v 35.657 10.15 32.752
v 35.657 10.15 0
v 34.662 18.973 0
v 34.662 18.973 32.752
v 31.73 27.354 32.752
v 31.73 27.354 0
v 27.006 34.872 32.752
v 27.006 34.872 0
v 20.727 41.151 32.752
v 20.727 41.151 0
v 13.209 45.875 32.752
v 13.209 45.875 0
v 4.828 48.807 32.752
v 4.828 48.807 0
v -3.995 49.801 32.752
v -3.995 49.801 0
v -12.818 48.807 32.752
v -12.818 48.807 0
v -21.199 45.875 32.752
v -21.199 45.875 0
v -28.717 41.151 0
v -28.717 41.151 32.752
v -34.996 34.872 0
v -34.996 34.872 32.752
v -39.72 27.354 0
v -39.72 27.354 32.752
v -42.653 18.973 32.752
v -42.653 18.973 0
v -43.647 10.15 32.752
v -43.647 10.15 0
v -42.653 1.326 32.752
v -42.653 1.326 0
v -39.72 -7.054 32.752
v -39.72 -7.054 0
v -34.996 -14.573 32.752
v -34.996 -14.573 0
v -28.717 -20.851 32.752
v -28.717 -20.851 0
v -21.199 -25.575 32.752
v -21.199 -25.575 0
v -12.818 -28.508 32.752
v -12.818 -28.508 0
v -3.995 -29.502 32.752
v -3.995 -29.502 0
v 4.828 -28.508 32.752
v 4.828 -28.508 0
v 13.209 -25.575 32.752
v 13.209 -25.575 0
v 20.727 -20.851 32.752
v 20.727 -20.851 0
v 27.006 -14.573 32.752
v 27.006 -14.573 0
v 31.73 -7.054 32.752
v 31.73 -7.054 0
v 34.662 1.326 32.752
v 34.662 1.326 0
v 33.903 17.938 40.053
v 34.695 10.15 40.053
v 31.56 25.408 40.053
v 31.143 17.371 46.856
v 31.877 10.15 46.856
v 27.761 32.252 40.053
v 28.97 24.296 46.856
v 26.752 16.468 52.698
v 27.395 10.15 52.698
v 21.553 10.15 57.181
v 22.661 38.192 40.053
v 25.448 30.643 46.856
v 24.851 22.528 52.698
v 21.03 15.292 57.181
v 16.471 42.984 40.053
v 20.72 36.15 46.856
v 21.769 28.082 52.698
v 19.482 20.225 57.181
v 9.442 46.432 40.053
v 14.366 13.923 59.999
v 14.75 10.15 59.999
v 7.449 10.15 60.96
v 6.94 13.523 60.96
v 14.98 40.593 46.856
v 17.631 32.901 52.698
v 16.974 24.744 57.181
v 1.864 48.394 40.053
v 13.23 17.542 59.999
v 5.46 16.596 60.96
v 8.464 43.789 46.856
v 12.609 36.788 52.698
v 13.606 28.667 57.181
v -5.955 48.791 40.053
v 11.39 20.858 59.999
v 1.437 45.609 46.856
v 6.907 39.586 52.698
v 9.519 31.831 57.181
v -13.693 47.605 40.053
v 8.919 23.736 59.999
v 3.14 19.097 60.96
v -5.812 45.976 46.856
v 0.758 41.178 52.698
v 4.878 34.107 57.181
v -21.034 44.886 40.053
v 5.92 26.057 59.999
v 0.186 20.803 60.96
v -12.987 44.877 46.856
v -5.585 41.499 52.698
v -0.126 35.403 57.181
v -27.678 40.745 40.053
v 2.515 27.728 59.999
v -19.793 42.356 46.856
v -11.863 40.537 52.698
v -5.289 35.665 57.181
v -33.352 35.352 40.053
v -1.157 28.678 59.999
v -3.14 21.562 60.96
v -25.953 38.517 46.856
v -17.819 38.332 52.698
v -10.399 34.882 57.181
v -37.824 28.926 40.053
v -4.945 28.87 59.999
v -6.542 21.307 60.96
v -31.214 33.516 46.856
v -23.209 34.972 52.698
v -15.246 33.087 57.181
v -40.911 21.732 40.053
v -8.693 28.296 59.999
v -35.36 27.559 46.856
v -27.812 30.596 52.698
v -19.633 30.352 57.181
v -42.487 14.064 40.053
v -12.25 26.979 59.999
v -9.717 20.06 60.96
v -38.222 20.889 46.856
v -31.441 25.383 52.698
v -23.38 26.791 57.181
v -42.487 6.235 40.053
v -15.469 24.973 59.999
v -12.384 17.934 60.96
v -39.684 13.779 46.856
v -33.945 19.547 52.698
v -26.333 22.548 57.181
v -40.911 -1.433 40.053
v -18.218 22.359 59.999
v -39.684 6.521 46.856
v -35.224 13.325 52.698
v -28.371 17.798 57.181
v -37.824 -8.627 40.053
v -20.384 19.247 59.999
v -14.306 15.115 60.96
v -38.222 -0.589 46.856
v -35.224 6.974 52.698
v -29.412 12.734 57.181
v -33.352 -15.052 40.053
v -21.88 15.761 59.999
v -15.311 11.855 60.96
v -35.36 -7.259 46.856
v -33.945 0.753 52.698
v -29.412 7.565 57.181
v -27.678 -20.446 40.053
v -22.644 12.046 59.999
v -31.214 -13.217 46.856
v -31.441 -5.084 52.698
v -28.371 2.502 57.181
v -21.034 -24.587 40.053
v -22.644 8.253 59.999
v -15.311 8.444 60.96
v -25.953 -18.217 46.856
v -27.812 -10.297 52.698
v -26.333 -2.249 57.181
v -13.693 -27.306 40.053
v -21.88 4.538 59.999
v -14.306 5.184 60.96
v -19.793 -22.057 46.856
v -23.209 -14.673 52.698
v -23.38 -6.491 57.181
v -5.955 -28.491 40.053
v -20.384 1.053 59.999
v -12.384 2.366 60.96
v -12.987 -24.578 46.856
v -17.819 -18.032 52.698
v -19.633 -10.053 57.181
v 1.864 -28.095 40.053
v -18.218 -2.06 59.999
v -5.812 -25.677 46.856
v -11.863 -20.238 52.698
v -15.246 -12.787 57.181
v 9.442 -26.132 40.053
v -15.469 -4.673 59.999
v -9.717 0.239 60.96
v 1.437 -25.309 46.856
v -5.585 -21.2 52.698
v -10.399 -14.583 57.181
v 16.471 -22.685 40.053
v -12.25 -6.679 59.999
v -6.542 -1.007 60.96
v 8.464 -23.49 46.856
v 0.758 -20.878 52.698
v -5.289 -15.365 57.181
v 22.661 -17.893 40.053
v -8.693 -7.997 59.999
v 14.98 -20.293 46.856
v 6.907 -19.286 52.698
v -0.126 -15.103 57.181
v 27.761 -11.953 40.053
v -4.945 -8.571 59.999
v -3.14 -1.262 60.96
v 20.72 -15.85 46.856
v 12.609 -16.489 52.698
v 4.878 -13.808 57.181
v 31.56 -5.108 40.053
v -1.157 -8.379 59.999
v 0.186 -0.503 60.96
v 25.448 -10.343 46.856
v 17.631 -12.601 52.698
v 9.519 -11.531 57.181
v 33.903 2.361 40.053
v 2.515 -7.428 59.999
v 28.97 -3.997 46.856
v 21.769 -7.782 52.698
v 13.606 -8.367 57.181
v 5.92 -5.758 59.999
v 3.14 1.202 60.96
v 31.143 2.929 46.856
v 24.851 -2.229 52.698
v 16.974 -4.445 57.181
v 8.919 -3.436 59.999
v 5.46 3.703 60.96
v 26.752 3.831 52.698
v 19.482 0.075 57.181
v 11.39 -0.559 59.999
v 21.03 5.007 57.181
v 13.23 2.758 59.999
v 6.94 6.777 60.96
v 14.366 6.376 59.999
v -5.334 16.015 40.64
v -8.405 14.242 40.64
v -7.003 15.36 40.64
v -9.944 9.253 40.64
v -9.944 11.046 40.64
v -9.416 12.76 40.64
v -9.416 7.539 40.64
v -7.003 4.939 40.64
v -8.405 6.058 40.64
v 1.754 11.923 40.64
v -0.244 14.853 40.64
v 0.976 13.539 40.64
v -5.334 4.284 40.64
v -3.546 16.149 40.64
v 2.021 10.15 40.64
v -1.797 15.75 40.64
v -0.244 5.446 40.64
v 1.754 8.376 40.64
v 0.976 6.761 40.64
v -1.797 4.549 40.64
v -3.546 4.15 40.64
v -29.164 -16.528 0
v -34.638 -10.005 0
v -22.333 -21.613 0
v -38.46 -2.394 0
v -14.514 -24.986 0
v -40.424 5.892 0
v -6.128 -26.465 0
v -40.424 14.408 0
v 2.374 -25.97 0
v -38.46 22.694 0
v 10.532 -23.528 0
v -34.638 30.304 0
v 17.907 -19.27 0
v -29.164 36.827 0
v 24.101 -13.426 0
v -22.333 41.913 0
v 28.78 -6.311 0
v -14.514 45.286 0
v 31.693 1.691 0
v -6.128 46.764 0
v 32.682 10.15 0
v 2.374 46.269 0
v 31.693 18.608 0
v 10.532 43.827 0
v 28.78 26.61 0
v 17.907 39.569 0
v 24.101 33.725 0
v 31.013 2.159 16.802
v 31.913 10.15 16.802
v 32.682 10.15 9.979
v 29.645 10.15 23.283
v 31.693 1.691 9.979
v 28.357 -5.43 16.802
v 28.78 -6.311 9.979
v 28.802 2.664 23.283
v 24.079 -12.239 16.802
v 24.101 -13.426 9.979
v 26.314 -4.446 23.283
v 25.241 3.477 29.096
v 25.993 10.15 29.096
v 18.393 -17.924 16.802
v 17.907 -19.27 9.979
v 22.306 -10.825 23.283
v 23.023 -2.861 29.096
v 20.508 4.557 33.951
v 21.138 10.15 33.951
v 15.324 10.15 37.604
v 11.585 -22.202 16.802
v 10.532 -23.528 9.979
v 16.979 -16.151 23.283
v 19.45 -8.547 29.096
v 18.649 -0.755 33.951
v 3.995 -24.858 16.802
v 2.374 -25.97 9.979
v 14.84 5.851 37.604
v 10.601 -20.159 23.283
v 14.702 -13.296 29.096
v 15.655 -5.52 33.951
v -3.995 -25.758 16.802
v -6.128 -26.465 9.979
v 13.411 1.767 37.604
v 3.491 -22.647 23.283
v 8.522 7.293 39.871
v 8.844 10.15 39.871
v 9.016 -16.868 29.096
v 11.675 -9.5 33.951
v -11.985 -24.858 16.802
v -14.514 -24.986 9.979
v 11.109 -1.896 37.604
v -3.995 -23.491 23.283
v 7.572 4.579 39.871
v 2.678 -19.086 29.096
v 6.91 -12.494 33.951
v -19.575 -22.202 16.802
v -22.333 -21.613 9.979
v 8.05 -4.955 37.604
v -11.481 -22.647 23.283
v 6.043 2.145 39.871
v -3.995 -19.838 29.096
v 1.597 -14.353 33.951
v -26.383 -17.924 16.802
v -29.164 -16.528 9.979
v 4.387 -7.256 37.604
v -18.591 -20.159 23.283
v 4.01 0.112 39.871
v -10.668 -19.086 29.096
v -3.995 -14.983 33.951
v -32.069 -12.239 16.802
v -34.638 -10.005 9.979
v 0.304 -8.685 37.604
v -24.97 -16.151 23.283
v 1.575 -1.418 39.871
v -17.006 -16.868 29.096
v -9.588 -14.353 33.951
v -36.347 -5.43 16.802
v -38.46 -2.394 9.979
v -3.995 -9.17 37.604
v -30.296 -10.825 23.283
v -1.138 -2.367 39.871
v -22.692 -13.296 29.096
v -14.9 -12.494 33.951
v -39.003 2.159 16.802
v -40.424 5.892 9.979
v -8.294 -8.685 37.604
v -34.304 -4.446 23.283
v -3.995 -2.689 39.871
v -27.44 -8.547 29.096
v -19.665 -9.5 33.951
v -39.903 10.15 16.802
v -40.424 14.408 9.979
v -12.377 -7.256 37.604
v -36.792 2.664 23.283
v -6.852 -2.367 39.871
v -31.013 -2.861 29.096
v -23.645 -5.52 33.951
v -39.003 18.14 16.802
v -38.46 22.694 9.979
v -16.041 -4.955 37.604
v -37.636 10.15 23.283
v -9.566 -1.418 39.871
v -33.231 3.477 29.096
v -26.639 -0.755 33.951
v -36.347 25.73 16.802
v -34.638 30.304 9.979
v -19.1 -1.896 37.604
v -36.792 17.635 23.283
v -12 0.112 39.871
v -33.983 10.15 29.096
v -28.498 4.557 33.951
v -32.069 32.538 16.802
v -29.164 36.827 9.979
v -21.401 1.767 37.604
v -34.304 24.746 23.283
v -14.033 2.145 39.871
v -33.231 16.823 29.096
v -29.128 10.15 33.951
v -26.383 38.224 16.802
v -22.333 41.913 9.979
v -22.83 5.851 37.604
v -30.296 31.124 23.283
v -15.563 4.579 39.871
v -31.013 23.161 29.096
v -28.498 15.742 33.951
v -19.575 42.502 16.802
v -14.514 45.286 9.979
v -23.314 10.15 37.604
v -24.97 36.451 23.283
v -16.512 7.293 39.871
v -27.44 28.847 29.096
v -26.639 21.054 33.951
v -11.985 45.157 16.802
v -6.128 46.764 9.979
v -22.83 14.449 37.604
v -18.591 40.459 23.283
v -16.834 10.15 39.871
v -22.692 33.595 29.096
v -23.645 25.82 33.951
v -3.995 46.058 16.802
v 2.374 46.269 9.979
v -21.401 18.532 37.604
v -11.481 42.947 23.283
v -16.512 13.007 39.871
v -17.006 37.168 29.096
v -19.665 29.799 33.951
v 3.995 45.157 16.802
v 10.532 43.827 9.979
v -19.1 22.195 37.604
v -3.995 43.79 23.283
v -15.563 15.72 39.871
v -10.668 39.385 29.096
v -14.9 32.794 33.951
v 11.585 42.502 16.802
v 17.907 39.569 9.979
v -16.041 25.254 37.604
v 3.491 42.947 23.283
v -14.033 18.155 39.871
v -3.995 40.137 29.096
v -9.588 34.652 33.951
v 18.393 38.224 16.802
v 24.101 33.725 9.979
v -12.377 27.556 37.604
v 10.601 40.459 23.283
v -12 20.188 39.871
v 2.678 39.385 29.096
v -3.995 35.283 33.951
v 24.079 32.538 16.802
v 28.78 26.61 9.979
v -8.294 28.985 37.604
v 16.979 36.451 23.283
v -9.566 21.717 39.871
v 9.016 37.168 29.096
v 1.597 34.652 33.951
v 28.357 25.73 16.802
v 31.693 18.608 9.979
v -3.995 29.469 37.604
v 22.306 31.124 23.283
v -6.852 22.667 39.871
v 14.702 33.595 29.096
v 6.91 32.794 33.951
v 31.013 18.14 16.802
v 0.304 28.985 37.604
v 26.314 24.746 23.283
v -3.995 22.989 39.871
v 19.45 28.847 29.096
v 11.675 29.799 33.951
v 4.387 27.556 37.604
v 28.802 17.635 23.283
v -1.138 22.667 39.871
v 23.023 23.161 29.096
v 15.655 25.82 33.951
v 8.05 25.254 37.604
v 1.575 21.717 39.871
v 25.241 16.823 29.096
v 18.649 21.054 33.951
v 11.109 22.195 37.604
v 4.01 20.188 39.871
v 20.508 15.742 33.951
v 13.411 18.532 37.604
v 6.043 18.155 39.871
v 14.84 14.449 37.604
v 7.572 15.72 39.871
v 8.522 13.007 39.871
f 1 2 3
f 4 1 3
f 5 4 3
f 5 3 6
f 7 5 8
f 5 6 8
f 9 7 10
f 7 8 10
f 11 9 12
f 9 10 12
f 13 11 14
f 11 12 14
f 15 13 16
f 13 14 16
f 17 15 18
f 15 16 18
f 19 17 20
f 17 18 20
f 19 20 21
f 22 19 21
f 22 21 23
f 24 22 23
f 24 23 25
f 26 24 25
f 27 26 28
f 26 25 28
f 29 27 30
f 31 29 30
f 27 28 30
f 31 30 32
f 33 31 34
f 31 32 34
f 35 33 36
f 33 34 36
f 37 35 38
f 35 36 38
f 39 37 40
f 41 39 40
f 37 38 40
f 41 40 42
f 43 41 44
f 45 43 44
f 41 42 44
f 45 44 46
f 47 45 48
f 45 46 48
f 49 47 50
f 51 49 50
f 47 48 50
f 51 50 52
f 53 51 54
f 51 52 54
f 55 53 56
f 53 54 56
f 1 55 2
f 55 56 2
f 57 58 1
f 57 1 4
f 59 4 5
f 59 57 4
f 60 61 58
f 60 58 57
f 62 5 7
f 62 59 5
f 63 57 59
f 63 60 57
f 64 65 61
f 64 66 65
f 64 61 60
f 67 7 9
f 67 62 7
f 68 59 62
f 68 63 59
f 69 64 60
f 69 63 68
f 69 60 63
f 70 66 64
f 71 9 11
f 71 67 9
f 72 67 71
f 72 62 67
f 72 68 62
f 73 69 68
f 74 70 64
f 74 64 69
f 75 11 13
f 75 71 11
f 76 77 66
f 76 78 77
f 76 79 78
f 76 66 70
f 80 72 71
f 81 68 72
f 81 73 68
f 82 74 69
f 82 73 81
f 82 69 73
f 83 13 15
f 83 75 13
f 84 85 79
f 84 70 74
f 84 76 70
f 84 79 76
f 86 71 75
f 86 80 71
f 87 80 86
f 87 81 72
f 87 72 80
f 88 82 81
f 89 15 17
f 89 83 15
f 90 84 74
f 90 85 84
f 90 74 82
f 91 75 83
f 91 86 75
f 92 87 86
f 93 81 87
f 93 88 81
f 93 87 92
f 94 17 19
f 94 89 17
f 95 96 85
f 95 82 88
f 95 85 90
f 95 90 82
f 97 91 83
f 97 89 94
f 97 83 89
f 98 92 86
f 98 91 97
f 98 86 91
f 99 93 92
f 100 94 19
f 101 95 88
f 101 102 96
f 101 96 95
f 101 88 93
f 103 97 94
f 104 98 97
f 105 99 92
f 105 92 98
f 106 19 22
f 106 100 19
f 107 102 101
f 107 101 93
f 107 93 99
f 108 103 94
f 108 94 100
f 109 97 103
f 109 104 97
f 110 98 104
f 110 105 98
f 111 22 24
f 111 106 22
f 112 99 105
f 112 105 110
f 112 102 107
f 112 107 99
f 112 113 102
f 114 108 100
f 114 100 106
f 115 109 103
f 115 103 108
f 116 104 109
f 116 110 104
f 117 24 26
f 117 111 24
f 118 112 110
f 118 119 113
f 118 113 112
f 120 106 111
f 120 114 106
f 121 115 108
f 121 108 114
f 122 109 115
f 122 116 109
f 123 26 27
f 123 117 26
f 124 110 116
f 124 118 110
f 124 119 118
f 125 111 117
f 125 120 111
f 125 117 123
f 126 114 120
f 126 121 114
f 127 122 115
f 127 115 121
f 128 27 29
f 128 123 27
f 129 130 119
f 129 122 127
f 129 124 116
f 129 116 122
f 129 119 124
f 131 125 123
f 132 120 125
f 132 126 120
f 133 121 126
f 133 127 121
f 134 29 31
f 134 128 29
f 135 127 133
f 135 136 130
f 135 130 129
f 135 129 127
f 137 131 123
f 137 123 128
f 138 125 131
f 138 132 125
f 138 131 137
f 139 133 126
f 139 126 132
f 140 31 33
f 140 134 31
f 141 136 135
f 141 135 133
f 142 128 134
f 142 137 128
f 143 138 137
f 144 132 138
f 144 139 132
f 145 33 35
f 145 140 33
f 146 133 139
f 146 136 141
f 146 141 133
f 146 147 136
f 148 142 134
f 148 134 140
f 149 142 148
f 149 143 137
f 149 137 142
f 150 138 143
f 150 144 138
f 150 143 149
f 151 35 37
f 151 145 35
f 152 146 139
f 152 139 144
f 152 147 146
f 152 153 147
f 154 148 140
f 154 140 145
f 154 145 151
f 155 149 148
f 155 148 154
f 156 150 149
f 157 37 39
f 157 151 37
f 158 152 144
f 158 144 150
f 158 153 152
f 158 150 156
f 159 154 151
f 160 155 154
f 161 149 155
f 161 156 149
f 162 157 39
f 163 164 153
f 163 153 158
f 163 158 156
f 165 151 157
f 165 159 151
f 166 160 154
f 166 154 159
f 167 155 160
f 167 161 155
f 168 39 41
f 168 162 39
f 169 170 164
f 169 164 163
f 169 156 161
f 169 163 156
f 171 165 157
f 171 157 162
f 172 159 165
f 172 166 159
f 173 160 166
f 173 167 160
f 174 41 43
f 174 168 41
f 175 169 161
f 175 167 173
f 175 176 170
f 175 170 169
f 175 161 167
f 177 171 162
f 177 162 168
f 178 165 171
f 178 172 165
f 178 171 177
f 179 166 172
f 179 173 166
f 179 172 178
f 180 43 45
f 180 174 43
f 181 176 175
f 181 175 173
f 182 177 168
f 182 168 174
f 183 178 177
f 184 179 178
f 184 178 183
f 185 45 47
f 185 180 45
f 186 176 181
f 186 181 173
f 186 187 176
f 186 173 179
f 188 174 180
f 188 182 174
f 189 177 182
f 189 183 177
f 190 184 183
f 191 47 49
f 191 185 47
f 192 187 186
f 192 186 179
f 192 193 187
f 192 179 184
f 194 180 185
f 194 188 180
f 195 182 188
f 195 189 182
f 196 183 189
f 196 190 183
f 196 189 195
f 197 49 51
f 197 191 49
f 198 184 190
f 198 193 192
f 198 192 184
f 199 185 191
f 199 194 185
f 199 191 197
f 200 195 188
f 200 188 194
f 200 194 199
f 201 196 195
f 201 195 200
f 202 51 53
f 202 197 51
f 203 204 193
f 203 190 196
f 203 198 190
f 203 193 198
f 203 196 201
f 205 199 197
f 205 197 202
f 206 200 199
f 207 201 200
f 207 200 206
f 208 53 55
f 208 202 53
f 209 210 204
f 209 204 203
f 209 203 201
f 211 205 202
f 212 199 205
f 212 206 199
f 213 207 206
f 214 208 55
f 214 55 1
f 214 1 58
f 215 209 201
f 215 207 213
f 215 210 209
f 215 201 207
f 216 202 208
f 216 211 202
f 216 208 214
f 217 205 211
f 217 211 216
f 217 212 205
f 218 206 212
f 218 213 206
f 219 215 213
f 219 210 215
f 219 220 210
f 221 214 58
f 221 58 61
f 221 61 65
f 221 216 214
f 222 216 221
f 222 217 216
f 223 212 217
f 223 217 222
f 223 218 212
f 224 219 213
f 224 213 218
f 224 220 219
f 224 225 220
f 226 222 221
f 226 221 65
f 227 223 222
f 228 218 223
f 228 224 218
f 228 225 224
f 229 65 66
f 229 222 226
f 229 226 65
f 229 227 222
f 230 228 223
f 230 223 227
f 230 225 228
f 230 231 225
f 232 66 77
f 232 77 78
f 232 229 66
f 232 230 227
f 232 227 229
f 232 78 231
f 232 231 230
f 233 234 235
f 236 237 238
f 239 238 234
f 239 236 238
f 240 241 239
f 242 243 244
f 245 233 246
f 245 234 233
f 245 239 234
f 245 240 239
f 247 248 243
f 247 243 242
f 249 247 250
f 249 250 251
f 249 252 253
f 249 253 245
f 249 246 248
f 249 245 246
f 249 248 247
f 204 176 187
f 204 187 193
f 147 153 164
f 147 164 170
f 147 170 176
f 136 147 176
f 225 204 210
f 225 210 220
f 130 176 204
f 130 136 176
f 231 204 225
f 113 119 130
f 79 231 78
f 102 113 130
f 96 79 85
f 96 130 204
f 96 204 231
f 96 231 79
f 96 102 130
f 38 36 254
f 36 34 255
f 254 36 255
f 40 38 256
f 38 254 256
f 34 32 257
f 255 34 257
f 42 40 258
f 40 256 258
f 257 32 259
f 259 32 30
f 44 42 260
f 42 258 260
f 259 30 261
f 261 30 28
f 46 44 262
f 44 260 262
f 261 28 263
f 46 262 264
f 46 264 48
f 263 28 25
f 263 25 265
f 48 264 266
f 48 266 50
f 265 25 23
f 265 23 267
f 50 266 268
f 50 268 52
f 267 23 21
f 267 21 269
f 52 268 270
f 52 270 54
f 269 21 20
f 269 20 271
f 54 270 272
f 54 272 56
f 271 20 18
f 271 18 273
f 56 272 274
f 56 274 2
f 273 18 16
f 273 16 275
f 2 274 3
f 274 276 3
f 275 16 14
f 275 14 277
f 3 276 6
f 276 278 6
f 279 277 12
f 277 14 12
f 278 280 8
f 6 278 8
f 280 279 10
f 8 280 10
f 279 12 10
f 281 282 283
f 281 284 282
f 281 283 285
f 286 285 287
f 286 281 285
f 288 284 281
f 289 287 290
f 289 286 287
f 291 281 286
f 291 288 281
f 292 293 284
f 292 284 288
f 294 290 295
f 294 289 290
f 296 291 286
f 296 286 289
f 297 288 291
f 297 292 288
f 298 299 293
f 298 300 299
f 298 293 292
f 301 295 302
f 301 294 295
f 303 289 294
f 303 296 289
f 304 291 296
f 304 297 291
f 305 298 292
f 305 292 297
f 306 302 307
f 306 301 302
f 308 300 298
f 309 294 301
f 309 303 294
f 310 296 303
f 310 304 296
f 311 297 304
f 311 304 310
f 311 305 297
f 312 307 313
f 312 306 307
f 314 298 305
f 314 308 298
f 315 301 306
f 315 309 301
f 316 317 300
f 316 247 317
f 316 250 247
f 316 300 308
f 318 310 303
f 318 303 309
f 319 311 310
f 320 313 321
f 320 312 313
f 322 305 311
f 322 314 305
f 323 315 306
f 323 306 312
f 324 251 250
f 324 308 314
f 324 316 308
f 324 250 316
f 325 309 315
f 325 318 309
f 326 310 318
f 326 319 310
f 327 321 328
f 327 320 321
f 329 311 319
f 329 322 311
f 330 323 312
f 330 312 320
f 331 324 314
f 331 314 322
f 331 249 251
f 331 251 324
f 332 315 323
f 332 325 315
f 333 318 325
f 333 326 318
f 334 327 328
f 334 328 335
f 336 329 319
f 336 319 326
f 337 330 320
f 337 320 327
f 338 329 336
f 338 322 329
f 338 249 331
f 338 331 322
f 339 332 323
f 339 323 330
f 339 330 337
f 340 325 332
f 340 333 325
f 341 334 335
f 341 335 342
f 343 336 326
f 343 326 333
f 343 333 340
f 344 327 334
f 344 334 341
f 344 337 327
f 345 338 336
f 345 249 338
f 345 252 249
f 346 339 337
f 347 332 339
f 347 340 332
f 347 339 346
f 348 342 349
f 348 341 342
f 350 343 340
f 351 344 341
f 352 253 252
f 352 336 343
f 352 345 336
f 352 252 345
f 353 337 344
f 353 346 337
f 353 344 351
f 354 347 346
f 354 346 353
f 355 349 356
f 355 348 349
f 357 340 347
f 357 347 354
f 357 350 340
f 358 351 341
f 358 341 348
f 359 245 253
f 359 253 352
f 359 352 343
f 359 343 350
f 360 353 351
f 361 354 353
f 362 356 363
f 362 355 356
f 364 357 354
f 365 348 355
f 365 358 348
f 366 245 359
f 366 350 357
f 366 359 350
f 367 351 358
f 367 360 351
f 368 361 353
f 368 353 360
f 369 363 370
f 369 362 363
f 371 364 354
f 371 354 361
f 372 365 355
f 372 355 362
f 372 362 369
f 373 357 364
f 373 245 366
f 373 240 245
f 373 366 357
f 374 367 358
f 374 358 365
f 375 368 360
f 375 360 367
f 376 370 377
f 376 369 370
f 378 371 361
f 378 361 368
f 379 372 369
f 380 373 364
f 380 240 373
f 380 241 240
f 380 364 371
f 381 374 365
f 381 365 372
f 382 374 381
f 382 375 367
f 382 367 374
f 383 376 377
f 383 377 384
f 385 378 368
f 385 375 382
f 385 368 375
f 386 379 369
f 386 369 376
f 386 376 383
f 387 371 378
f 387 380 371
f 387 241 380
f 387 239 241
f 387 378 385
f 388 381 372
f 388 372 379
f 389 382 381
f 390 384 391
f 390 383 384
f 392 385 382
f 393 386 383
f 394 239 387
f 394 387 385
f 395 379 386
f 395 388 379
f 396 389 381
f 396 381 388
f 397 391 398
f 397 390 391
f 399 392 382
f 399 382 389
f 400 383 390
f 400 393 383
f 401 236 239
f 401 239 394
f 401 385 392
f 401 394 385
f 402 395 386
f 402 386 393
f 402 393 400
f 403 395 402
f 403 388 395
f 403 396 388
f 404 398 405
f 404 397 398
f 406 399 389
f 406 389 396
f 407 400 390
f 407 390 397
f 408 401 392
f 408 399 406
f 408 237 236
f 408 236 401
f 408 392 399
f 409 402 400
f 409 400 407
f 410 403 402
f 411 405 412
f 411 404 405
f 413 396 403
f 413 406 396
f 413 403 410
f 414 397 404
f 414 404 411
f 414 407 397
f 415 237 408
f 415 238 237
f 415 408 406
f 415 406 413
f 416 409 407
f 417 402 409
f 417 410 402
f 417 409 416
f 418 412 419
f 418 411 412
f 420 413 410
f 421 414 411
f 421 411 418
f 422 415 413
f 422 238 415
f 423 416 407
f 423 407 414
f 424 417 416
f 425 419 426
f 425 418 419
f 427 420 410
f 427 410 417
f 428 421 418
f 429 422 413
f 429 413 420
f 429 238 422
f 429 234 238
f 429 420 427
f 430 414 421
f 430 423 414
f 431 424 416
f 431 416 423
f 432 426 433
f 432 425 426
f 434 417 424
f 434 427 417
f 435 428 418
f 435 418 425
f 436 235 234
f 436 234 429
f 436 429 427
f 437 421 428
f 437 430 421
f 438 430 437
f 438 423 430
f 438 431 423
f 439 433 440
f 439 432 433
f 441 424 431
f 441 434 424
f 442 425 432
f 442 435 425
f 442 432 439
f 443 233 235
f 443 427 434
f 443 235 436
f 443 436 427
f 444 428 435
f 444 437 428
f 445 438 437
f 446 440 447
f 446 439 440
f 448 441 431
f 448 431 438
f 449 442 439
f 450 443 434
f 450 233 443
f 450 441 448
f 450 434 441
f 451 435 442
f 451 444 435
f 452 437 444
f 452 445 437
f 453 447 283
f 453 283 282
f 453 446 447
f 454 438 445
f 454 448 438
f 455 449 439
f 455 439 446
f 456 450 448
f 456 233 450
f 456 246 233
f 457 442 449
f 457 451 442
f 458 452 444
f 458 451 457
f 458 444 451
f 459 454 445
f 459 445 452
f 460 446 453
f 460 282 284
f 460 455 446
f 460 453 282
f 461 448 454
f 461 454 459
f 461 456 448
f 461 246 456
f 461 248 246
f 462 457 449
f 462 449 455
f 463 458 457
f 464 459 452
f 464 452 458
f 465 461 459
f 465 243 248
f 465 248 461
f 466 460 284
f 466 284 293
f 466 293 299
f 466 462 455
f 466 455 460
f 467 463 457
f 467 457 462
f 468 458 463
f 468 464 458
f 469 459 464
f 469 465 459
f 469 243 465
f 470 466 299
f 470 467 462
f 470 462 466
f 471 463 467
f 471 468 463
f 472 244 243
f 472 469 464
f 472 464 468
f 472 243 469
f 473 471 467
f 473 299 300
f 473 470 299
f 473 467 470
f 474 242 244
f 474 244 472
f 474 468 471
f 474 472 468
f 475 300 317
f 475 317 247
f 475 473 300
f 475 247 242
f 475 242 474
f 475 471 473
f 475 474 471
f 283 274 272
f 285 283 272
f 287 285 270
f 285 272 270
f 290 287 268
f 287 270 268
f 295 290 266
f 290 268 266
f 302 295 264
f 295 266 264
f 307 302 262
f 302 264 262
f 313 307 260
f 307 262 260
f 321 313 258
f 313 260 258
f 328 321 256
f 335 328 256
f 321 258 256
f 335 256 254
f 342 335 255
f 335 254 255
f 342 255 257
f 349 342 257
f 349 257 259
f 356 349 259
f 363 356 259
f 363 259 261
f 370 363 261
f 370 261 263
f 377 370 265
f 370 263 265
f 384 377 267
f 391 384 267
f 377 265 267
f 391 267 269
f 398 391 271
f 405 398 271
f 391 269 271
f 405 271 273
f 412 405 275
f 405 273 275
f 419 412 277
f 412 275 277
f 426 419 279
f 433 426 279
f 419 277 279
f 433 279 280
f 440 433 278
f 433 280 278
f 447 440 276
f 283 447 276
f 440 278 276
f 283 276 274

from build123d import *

# Parameters (mm, degrees)
F0_R     = 39.651644
F1_DEPTH = 60.96
F2_R     = 28.207671
F3_R     = 36.676793
F4_DEPTH = 40.64
F5_R     = 30.660512


with BuildPart() as f1:
    # F0 (on Top) → F1 (new body)
    with BuildSketch(Plane.XY):
        with Locations((-3.995102, 10.149716)):
            Circle(F0_R)
    extrude(amount=F1_DEPTH)

    # F2
    f2_edges = [f1.edges().sort_by_distance(p)[0] for p in [
        (-43.646746, 10.149716, 60.96),
    ]]
    fillet(f2_edges, radius=F2_R)

    # F3 (on face) → F4 (cut)
    with BuildSketch(Plane(origin=(0, 0, 0), x_dir=(1, 0, 0), z_dir=(0, 0, -1))):
        with Locations((-3.995102, -10.149716)):
            Circle(F3_R)
    extrude(amount=-F4_DEPTH, mode=Mode.SUBTRACT)

    # F5
    f5_edges = [f1.edges().sort_by_distance(p)[0] for p in [
        (-40.671895, 10.149716, 40.64),
    ]]
    fillet(f5_edges, radius=F5_R)


solid = f1.part
